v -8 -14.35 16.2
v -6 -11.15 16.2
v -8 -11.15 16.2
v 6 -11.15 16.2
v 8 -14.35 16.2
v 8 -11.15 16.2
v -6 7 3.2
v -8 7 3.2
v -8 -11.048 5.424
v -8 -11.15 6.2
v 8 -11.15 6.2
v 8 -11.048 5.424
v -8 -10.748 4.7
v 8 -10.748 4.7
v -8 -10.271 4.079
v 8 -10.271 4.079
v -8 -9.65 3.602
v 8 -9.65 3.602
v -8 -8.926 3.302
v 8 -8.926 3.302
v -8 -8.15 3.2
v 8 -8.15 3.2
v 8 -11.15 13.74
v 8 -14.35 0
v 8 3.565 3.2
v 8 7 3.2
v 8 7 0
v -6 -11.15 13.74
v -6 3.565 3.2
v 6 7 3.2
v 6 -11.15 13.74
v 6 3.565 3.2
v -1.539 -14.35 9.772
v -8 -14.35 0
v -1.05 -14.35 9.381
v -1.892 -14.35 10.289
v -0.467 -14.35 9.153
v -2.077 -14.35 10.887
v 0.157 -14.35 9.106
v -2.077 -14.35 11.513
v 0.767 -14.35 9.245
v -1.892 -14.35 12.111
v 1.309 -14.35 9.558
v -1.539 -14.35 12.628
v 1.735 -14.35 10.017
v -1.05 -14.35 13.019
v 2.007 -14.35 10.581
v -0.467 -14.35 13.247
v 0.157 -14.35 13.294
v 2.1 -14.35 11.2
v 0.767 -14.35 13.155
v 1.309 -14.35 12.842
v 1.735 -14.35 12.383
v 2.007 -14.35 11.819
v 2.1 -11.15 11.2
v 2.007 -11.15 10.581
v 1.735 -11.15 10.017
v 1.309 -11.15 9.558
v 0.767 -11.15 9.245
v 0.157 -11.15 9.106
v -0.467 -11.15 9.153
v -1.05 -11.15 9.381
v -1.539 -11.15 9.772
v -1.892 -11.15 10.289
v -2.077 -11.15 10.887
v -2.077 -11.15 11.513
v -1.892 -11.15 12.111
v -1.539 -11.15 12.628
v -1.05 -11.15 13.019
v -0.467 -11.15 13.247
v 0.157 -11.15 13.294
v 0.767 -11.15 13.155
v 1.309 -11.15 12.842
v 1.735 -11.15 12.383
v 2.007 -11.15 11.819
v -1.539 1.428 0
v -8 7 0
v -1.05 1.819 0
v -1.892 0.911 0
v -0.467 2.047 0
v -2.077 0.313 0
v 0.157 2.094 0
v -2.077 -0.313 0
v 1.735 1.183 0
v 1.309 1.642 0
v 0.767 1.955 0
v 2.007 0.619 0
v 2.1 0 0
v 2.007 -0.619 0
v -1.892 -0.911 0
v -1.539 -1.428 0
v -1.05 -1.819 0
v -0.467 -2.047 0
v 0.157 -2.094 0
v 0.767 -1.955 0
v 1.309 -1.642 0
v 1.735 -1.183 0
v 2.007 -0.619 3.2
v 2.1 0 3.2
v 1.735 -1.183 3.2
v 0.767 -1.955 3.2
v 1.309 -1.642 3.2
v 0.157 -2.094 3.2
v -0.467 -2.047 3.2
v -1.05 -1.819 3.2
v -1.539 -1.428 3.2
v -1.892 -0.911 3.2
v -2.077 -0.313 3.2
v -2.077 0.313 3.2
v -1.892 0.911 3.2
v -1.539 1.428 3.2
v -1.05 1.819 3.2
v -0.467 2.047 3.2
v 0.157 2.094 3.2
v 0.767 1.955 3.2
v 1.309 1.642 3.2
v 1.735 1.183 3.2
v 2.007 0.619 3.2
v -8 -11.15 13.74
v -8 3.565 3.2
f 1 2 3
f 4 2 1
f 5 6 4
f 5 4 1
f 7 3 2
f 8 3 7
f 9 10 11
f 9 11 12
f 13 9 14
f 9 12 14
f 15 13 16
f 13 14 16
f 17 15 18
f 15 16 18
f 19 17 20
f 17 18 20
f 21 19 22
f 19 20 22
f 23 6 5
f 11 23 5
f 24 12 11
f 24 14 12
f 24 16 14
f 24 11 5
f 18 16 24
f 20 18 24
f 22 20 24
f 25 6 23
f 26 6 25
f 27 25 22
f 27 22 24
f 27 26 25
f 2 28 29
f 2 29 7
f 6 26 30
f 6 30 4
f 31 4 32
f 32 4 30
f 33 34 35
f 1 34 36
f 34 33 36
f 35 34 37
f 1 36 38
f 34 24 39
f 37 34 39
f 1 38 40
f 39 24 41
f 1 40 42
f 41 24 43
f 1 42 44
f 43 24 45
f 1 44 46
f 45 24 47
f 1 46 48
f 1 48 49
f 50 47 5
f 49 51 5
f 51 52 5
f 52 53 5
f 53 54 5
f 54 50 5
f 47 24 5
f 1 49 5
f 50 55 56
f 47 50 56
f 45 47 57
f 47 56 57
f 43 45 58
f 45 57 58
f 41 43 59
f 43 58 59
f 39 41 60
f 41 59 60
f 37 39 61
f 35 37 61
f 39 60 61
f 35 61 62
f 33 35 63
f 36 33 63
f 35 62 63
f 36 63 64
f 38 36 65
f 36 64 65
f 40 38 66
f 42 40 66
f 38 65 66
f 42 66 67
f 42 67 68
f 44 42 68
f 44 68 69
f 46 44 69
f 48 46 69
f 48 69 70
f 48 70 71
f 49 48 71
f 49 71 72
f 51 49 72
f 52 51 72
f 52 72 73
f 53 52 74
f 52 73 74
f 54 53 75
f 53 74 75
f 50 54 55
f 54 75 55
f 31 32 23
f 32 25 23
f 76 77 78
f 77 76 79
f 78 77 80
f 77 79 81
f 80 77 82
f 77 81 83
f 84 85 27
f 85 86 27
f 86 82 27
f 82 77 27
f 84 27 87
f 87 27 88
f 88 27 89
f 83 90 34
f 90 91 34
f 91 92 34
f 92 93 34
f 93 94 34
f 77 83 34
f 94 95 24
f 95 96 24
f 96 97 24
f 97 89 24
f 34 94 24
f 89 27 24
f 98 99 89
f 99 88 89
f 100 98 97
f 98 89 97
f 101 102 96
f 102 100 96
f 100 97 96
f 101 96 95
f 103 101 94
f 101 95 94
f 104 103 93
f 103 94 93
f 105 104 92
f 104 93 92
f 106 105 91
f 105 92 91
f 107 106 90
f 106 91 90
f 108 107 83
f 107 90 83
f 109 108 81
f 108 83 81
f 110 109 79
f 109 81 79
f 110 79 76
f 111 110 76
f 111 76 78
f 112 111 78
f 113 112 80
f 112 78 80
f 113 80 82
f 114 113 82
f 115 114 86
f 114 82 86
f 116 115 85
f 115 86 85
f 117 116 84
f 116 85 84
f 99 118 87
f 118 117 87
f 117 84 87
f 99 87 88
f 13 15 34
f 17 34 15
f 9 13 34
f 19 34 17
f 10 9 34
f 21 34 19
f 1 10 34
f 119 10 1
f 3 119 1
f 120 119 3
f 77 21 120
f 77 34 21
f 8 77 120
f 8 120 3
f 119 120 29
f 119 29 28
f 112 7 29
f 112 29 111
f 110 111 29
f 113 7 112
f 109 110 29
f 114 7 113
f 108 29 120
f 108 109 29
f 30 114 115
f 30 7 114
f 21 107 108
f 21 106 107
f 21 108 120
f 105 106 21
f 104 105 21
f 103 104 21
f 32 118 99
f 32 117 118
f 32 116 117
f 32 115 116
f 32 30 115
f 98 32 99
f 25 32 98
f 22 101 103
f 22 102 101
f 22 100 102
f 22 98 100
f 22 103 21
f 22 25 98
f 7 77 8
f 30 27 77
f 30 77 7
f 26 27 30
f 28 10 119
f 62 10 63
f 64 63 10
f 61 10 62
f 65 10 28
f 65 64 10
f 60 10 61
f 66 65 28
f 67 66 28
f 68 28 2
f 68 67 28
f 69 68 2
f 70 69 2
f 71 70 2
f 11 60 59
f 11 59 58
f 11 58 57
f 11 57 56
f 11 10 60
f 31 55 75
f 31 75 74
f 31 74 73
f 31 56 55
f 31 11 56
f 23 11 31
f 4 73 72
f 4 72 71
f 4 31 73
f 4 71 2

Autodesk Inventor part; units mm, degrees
ref_plane "YZ Plane" through (0, 0, 0) normal (1, 0, 0) x (0, 1, 0)
ref_plane "XZ Plane" through (0, 0, 0) normal (0, 1, 0) x (-1, 0, 0)
ref_plane "XY Plane" through (0, 0, 0) normal (0, 0, 1) x (1, 0, 0)
sketch "Эскиз1" plane through (0, 0, 0) normal (0, 0, 1) x (1, 0, 0)
  circle A0 centre (0, 0) radius 2.1
  line L0 (-5, 14.35) -> (5, 14.35)
  line L1 (5, 14.35) -> (5, -14.35)
  line L2 (5, -14.35) -> (-5, -14.35)
  line L3 (-5, -14.35) -> (-5, 14.35)
  line L4 (-5, 14.35) -> (5, -14.35) construction
  line L5 (5, 14.35) -> (-5, -14.35) construction
  line L6 (-5, 7) -> (5, 7)
  dimension "d0" = 4.2
  dimension "d2" = 10
  dimension "d3" = 28.7
  dimension "d4" = 7
extrude "Выдавливание1" add sketch "Эскиз1" along normal blind 3.2 contours L6 L1 L2 L3
sketch "Эскиз2" plane through (0, 0, 3.2) normal (0, 0, 1) x (1, 0, 0)
  line L0 (5, -14.35) -> (5, 7) projected
  line L1 (5, -14.35) -> (-5, -14.35)
  line L2 (-5, -14.35) -> (-5, -11.15)
  line L3 (-5, -11.15) -> (5, -11.15)
  line L4 (5, -11.15) -> (5, -14.35)
  point P0 (0, 0)
  point P1 (5, -11.15)
  dimension "d7" = 10
  dimension "d8" = 3.2
extrude "Выдавливание2" add sketch "Эскиз2" along normal blind 13
fillet "Сопряжение1" radius 3 1 edges at (0, -11.15, 3.2)
sketch "Эскиз3" plane through (-5, -11.15, 16.2) normal (0, 1, 0) x (1, 0, 0)
  line L0 (0, 10) -> (10, 10) projected
  line L1 (5, 10) -> (5, 0)
  line L2 (0, 0) -> (10, 0) projected
  circle A0 centre (5, 5) radius 2.1
  point P0 (5, 16.2)
  dimension "d12" = 4.2
extrude "Выдавливание3" cut sketch "Эскиз3" against normal blind 13
sketch "Эскиз4" plane through (5, -14.35, 0) normal (1, 0, 0) x (0, 0, -1)
  line L0 (0, 0) -> (0, 21.35) projected
  line L1 (0, 21.35) -> (-3.2, 21.35) projected
  line L2 (-3.2, 6.2) -> (-3.2, 21.35) projected
  arc A0 (-6.2, 3.2) -> (-3.2, 6.2) centre (-6.2, 6.2) ccw projected
  line L3 (-6.2, 3.2) -> (-16.2, 3.2) projected
  line L4 (-16.2, 0) -> (-16.2, 3.2) projected
  line L5 (0, 0) -> (-16.2, 0) projected
  point P0 (0, 14.35)
extrude "Выдавливание4" add sketch "Эскиз4" along normal blind 3
sketch "Эскиз5" plane through (-5, -14.35, 0) normal (-1, 0, 0) x (0, 0, 1)
  line L0 (0, 21.35) -> (0, 0) projected
  line L1 (0, 0) -> (16.2, 0) projected
  line L2 (16.2, 3.2) -> (16.2, 0) projected
  line L3 (6.2, 3.2) -> (16.2, 3.2) projected
  arc A0 (3.2, 6.2) -> (6.2, 3.2) centre (6.2, 6.2) ccw projected
  line L4 (3.2, 21.35) -> (3.2, 6.2) projected
  line L5 (0, 21.35) -> (3.2, 21.35) projected
  point P0 (0, 14.35)
extrude "Выдавливание5" add sketch "Эскиз5" along normal blind 3
sketch "Эскиз6" plane through (8, -14.35, 0) normal (1, 0, 0) x (0, 0, -1)
  line L0 (-16.2, 3.2) -> (-16.2, 0) projected
  line L1 (-3.2, 21.35) -> (-16.2, 3.2)
  line L2 (-1.574, 20.1854) -> (-14.2, 2.5576)
  line L3 (-14.2, 2.5576) -> (-14.2, 0)
  line L4 (0, 0) -> (-16.2, 0) projected
  line L5 (0, 0) -> (0, 21.35) projected
  line L6 (0, 21.35) -> (-3.2, 21.35) projected
  line L7 (-3.2, 21.35) -> (-3.2, 6.2) projected
  arc A0 (-6.2, 3.2) -> (-3.2, 6.2) centre (-6.2, 6.2) ccw projected
  line L8 (-6.2, 3.2) -> (-16.2, 3.2) projected
  line L9 (-16.2, 3.2) -> (-16.2, 0) projected
  line L10 (-16.2, 0) -> (0, 0) projected
  point P0 (0, 14.35)
  point P1 (-13.7399, 3.2)
  point P2 (-3.2, 17.9153)
  dimension "d19" = 2
extrude "Выдавливание6" add sketch "Эскиз6" against normal blind 2 contours L1 L7 L2 L8
sketch "Эскиз7" plane through (-8, -14.35, 0) normal (-1, 0, 0) x (0, 0, 1)
  line L0 (16.2, 3.2) -> (13.7399, 3.2) projected
  line L1 (16.2, 3.2) -> (3.2, 21.35) projected
  line L2 (3.2, 17.9153) -> (3.2, 21.35) projected
  line L3 (3.2, 17.9153) -> (13.7399, 3.2) projected
  point P0 (0, 14.35)
extrude "Выдавливание7" add sketch "Эскиз7" against normal blind 2
properties part number "мертвое колесо крепл 25-26"
